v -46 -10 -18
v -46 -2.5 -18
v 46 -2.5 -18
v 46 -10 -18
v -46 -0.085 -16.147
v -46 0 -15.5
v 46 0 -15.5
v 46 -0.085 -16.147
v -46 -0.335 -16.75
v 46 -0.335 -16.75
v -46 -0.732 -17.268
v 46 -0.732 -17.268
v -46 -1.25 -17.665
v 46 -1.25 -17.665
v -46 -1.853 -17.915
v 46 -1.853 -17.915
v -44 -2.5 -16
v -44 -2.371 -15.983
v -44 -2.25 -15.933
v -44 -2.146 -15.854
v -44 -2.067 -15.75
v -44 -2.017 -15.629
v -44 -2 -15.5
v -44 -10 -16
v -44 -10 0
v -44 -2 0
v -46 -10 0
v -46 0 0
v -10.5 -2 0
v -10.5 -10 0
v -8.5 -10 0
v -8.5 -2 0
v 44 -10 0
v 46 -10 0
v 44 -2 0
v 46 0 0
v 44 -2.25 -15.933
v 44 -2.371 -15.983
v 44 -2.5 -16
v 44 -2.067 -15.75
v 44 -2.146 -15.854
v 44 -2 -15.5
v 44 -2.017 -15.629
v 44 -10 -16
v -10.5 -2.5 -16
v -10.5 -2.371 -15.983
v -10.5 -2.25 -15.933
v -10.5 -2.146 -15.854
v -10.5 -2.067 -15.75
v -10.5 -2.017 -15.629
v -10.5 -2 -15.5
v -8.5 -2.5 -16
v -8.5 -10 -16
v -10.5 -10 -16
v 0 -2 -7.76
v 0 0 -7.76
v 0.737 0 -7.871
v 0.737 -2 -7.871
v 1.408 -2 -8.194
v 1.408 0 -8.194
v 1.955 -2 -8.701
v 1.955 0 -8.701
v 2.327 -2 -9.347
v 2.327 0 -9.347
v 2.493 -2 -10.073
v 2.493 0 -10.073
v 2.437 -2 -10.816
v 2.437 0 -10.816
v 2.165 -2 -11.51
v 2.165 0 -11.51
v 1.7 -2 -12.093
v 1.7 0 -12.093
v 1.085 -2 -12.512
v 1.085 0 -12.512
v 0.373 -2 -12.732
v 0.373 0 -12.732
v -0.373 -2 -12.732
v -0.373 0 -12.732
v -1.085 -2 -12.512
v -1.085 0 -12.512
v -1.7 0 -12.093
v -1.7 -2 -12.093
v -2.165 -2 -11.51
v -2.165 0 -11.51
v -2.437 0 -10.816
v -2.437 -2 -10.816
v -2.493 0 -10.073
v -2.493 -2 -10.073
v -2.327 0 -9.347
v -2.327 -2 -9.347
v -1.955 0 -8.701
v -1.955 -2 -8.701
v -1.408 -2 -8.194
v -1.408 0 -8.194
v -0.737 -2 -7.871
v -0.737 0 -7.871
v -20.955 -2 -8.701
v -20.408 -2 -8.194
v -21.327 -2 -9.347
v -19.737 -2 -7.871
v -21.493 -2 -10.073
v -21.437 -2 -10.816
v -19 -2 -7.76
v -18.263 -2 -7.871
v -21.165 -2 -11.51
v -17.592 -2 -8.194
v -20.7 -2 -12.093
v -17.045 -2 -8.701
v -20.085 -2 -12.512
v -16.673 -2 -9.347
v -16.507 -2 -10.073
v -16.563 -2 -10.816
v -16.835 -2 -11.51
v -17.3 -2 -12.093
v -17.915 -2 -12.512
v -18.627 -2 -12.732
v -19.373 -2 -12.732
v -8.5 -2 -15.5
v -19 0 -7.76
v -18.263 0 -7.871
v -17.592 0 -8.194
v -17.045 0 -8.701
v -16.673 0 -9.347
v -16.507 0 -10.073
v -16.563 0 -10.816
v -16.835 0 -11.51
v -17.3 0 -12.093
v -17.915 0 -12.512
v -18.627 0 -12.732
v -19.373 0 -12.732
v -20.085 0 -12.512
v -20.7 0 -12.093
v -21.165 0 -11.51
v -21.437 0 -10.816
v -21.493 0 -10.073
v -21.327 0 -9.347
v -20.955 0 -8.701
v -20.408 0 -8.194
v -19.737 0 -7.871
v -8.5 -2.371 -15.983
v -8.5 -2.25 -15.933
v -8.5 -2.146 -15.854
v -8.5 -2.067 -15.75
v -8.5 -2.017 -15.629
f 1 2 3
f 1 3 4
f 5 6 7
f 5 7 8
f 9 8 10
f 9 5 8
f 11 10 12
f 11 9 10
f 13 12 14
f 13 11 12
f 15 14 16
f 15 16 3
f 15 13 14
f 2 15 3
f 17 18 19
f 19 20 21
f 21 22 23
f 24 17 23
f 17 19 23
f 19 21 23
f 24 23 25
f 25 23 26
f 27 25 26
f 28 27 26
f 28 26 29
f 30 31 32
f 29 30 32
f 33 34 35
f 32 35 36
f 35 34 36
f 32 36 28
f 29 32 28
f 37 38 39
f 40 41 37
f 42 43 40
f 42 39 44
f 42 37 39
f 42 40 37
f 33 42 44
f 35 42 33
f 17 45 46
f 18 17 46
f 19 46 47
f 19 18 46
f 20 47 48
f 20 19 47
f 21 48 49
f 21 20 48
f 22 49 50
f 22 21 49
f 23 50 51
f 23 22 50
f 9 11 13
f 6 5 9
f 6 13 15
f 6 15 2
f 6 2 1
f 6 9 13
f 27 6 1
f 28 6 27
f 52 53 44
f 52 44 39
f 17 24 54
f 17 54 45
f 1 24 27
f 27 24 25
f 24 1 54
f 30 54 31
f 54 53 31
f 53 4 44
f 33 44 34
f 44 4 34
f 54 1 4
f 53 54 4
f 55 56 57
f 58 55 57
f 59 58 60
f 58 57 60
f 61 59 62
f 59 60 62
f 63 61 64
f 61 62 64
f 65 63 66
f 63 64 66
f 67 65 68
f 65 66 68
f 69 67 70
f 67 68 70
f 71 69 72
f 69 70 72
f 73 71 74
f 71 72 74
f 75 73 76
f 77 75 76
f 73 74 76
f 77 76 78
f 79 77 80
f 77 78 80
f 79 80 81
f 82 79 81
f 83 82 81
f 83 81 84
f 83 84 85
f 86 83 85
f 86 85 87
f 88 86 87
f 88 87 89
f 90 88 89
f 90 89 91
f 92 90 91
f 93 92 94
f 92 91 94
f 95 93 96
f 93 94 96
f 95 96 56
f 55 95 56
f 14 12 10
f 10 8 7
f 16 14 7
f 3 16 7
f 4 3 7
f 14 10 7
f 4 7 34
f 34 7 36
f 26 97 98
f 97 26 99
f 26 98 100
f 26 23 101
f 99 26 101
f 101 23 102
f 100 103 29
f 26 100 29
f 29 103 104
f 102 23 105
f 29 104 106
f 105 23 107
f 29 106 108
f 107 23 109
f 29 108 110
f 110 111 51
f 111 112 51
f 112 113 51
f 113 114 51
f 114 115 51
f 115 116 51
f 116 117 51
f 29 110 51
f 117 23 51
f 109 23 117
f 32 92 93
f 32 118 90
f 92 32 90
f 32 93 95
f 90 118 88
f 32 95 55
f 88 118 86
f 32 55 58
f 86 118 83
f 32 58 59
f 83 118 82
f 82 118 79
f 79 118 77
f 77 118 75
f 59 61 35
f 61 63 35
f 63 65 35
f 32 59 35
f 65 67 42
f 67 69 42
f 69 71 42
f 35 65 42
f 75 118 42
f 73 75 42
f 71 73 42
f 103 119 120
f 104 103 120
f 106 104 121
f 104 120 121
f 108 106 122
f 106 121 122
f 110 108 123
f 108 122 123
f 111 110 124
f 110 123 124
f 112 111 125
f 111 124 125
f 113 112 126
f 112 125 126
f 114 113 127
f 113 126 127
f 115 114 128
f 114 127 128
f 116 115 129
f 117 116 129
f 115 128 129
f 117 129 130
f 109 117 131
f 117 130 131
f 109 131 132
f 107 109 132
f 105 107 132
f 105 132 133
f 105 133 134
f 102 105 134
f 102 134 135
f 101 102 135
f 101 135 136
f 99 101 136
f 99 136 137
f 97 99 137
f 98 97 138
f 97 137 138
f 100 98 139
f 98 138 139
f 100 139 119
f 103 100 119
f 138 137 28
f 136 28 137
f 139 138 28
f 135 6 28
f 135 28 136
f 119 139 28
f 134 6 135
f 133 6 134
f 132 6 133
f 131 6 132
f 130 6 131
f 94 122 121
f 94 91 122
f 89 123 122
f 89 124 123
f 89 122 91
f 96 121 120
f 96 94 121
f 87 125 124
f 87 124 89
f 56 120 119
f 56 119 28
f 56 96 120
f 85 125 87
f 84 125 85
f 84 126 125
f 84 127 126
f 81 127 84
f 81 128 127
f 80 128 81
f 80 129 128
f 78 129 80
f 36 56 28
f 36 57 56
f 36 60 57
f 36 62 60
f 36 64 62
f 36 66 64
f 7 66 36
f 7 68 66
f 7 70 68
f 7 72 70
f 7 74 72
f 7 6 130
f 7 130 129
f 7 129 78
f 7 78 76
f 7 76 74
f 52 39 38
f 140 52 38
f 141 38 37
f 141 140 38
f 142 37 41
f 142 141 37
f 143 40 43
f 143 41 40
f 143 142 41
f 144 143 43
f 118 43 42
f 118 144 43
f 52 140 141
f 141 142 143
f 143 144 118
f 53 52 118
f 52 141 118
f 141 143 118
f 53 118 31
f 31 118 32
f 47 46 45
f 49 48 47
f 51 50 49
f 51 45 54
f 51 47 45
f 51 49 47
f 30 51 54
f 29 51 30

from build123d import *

# Parameters (mm, degrees)
SKETCH1_W                    = 92
SKETCH1_H                    = 18
BASE_FLANGE1_DEPTH           = 2
SKETCH11_R                   = 2.5
CUT_EXTRUDE1_DEPTH           = 2
EDGE_FLANGE1_STRIP_W         = 9
EDGE_FLANGE1_STRIP_H         = 2
EDGE_FLANGE1_STRIP_CUT_DEPTH = 92
EDGE_FLANGE1_DEPTH           = 92
BOSS_EXTRUDE2_DEPTH          = 2
LPATTERN1_COUNT              = 2
LPATTERN1_PITCH              = 35.5


# Sheet-metal steps are written as plain solids
with BuildPart() as part:
    # Sketch1 → Base-Flange1 (new body)
    with BuildSketch(Plane(origin=(0, 0, 0), x_dir=(1, 0, 0), z_dir=(0, 1, 0))):
        with Locations((0, 9)):
            Rectangle(SKETCH1_W, SKETCH1_H)
    extrude(amount=-BASE_FLANGE1_DEPTH)

    # Sketch11 → Cut-Extrude1 (cut)
    with BuildSketch(Plane(origin=(0, 0, 0), x_dir=(1, 0, 0), z_dir=(0, 1, 0))):
        with Locations(Location((0, 10.26, 0), (0, 0, 270))):
            Circle(SKETCH11_R)
        with Locations(Location((-19, 10.26, 0), (0, 0, 270))):
            Circle(SKETCH11_R)
    extrude(amount=-CUT_EXTRUDE1_DEPTH, mode=Mode.SUBTRACT)

    # Edge-Flange1 strip (across the edge) → Edge-Flange1 strip cut (cut)
    with BuildSketch(Plane(origin=(-46, -2, -18), x_dir=(0, 0, 1), z_dir=(1, 0, 0))):
        with Locations((-2, -1)):
            Rectangle(EDGE_FLANGE1_STRIP_W, EDGE_FLANGE1_STRIP_H)
    extrude(amount=EDGE_FLANGE1_STRIP_CUT_DEPTH, mode=Mode.SUBTRACT)

    # Edge-Flange1 section (across the edge) → Edge-Flange1 (add)
    with BuildSketch(Plane(origin=(-46, -2, -18), x_dir=(0, 0, 1), z_dir=(1, 0, 0))):
        with BuildLine():
            Line((0, 0.5), (0, 8))
            Line((0, 8), (2, 8))
            Line((2, 8), (2, 0.5))
            ThreePointArc((2, 0.5), (2.146446609, 0.146446609), (2.5, 0))
            Line((2.5, 0), (2.5, -2))
            ThreePointArc((2.5, -2), (0.732233047, -1.267766953), (0, 0.5))
        make_face()
    extrude(amount=EDGE_FLANGE1_DEPTH)

    # Sketch18 → Boss-Extrude2 (add)
    with BuildSketch(Plane.ZY.offset(46)):
        with BuildLine():
            Line((0, -2), (-15.5, -2))
            ThreePointArc((-15.5, -2), (-15.853553391, -2.146446609), (-16, -2.5))
            Line((-16, -2.5), (-16, -10))
            Line((-16, -10), (0, -10))
            Line((0, -10), (0, -2))
        make_face()
    boss_extrude2 = extrude(amount=-BOSS_EXTRUDE2_DEPTH)

    # LPattern1: Boss-Extrude2 ×2
    with Locations(*[(i * LPATTERN1_PITCH, 0, 0) for i in range(1, LPATTERN1_COUNT)]):
        add(boss_extrude2)

    # Mirror2: Boss-Extrude2 across plane
    add(boss_extrude2.mirror(Plane(origin=(0, 0, 0), x_dir=(0, 0, 1), z_dir=(1, 0, 0))))


solid = part.part
